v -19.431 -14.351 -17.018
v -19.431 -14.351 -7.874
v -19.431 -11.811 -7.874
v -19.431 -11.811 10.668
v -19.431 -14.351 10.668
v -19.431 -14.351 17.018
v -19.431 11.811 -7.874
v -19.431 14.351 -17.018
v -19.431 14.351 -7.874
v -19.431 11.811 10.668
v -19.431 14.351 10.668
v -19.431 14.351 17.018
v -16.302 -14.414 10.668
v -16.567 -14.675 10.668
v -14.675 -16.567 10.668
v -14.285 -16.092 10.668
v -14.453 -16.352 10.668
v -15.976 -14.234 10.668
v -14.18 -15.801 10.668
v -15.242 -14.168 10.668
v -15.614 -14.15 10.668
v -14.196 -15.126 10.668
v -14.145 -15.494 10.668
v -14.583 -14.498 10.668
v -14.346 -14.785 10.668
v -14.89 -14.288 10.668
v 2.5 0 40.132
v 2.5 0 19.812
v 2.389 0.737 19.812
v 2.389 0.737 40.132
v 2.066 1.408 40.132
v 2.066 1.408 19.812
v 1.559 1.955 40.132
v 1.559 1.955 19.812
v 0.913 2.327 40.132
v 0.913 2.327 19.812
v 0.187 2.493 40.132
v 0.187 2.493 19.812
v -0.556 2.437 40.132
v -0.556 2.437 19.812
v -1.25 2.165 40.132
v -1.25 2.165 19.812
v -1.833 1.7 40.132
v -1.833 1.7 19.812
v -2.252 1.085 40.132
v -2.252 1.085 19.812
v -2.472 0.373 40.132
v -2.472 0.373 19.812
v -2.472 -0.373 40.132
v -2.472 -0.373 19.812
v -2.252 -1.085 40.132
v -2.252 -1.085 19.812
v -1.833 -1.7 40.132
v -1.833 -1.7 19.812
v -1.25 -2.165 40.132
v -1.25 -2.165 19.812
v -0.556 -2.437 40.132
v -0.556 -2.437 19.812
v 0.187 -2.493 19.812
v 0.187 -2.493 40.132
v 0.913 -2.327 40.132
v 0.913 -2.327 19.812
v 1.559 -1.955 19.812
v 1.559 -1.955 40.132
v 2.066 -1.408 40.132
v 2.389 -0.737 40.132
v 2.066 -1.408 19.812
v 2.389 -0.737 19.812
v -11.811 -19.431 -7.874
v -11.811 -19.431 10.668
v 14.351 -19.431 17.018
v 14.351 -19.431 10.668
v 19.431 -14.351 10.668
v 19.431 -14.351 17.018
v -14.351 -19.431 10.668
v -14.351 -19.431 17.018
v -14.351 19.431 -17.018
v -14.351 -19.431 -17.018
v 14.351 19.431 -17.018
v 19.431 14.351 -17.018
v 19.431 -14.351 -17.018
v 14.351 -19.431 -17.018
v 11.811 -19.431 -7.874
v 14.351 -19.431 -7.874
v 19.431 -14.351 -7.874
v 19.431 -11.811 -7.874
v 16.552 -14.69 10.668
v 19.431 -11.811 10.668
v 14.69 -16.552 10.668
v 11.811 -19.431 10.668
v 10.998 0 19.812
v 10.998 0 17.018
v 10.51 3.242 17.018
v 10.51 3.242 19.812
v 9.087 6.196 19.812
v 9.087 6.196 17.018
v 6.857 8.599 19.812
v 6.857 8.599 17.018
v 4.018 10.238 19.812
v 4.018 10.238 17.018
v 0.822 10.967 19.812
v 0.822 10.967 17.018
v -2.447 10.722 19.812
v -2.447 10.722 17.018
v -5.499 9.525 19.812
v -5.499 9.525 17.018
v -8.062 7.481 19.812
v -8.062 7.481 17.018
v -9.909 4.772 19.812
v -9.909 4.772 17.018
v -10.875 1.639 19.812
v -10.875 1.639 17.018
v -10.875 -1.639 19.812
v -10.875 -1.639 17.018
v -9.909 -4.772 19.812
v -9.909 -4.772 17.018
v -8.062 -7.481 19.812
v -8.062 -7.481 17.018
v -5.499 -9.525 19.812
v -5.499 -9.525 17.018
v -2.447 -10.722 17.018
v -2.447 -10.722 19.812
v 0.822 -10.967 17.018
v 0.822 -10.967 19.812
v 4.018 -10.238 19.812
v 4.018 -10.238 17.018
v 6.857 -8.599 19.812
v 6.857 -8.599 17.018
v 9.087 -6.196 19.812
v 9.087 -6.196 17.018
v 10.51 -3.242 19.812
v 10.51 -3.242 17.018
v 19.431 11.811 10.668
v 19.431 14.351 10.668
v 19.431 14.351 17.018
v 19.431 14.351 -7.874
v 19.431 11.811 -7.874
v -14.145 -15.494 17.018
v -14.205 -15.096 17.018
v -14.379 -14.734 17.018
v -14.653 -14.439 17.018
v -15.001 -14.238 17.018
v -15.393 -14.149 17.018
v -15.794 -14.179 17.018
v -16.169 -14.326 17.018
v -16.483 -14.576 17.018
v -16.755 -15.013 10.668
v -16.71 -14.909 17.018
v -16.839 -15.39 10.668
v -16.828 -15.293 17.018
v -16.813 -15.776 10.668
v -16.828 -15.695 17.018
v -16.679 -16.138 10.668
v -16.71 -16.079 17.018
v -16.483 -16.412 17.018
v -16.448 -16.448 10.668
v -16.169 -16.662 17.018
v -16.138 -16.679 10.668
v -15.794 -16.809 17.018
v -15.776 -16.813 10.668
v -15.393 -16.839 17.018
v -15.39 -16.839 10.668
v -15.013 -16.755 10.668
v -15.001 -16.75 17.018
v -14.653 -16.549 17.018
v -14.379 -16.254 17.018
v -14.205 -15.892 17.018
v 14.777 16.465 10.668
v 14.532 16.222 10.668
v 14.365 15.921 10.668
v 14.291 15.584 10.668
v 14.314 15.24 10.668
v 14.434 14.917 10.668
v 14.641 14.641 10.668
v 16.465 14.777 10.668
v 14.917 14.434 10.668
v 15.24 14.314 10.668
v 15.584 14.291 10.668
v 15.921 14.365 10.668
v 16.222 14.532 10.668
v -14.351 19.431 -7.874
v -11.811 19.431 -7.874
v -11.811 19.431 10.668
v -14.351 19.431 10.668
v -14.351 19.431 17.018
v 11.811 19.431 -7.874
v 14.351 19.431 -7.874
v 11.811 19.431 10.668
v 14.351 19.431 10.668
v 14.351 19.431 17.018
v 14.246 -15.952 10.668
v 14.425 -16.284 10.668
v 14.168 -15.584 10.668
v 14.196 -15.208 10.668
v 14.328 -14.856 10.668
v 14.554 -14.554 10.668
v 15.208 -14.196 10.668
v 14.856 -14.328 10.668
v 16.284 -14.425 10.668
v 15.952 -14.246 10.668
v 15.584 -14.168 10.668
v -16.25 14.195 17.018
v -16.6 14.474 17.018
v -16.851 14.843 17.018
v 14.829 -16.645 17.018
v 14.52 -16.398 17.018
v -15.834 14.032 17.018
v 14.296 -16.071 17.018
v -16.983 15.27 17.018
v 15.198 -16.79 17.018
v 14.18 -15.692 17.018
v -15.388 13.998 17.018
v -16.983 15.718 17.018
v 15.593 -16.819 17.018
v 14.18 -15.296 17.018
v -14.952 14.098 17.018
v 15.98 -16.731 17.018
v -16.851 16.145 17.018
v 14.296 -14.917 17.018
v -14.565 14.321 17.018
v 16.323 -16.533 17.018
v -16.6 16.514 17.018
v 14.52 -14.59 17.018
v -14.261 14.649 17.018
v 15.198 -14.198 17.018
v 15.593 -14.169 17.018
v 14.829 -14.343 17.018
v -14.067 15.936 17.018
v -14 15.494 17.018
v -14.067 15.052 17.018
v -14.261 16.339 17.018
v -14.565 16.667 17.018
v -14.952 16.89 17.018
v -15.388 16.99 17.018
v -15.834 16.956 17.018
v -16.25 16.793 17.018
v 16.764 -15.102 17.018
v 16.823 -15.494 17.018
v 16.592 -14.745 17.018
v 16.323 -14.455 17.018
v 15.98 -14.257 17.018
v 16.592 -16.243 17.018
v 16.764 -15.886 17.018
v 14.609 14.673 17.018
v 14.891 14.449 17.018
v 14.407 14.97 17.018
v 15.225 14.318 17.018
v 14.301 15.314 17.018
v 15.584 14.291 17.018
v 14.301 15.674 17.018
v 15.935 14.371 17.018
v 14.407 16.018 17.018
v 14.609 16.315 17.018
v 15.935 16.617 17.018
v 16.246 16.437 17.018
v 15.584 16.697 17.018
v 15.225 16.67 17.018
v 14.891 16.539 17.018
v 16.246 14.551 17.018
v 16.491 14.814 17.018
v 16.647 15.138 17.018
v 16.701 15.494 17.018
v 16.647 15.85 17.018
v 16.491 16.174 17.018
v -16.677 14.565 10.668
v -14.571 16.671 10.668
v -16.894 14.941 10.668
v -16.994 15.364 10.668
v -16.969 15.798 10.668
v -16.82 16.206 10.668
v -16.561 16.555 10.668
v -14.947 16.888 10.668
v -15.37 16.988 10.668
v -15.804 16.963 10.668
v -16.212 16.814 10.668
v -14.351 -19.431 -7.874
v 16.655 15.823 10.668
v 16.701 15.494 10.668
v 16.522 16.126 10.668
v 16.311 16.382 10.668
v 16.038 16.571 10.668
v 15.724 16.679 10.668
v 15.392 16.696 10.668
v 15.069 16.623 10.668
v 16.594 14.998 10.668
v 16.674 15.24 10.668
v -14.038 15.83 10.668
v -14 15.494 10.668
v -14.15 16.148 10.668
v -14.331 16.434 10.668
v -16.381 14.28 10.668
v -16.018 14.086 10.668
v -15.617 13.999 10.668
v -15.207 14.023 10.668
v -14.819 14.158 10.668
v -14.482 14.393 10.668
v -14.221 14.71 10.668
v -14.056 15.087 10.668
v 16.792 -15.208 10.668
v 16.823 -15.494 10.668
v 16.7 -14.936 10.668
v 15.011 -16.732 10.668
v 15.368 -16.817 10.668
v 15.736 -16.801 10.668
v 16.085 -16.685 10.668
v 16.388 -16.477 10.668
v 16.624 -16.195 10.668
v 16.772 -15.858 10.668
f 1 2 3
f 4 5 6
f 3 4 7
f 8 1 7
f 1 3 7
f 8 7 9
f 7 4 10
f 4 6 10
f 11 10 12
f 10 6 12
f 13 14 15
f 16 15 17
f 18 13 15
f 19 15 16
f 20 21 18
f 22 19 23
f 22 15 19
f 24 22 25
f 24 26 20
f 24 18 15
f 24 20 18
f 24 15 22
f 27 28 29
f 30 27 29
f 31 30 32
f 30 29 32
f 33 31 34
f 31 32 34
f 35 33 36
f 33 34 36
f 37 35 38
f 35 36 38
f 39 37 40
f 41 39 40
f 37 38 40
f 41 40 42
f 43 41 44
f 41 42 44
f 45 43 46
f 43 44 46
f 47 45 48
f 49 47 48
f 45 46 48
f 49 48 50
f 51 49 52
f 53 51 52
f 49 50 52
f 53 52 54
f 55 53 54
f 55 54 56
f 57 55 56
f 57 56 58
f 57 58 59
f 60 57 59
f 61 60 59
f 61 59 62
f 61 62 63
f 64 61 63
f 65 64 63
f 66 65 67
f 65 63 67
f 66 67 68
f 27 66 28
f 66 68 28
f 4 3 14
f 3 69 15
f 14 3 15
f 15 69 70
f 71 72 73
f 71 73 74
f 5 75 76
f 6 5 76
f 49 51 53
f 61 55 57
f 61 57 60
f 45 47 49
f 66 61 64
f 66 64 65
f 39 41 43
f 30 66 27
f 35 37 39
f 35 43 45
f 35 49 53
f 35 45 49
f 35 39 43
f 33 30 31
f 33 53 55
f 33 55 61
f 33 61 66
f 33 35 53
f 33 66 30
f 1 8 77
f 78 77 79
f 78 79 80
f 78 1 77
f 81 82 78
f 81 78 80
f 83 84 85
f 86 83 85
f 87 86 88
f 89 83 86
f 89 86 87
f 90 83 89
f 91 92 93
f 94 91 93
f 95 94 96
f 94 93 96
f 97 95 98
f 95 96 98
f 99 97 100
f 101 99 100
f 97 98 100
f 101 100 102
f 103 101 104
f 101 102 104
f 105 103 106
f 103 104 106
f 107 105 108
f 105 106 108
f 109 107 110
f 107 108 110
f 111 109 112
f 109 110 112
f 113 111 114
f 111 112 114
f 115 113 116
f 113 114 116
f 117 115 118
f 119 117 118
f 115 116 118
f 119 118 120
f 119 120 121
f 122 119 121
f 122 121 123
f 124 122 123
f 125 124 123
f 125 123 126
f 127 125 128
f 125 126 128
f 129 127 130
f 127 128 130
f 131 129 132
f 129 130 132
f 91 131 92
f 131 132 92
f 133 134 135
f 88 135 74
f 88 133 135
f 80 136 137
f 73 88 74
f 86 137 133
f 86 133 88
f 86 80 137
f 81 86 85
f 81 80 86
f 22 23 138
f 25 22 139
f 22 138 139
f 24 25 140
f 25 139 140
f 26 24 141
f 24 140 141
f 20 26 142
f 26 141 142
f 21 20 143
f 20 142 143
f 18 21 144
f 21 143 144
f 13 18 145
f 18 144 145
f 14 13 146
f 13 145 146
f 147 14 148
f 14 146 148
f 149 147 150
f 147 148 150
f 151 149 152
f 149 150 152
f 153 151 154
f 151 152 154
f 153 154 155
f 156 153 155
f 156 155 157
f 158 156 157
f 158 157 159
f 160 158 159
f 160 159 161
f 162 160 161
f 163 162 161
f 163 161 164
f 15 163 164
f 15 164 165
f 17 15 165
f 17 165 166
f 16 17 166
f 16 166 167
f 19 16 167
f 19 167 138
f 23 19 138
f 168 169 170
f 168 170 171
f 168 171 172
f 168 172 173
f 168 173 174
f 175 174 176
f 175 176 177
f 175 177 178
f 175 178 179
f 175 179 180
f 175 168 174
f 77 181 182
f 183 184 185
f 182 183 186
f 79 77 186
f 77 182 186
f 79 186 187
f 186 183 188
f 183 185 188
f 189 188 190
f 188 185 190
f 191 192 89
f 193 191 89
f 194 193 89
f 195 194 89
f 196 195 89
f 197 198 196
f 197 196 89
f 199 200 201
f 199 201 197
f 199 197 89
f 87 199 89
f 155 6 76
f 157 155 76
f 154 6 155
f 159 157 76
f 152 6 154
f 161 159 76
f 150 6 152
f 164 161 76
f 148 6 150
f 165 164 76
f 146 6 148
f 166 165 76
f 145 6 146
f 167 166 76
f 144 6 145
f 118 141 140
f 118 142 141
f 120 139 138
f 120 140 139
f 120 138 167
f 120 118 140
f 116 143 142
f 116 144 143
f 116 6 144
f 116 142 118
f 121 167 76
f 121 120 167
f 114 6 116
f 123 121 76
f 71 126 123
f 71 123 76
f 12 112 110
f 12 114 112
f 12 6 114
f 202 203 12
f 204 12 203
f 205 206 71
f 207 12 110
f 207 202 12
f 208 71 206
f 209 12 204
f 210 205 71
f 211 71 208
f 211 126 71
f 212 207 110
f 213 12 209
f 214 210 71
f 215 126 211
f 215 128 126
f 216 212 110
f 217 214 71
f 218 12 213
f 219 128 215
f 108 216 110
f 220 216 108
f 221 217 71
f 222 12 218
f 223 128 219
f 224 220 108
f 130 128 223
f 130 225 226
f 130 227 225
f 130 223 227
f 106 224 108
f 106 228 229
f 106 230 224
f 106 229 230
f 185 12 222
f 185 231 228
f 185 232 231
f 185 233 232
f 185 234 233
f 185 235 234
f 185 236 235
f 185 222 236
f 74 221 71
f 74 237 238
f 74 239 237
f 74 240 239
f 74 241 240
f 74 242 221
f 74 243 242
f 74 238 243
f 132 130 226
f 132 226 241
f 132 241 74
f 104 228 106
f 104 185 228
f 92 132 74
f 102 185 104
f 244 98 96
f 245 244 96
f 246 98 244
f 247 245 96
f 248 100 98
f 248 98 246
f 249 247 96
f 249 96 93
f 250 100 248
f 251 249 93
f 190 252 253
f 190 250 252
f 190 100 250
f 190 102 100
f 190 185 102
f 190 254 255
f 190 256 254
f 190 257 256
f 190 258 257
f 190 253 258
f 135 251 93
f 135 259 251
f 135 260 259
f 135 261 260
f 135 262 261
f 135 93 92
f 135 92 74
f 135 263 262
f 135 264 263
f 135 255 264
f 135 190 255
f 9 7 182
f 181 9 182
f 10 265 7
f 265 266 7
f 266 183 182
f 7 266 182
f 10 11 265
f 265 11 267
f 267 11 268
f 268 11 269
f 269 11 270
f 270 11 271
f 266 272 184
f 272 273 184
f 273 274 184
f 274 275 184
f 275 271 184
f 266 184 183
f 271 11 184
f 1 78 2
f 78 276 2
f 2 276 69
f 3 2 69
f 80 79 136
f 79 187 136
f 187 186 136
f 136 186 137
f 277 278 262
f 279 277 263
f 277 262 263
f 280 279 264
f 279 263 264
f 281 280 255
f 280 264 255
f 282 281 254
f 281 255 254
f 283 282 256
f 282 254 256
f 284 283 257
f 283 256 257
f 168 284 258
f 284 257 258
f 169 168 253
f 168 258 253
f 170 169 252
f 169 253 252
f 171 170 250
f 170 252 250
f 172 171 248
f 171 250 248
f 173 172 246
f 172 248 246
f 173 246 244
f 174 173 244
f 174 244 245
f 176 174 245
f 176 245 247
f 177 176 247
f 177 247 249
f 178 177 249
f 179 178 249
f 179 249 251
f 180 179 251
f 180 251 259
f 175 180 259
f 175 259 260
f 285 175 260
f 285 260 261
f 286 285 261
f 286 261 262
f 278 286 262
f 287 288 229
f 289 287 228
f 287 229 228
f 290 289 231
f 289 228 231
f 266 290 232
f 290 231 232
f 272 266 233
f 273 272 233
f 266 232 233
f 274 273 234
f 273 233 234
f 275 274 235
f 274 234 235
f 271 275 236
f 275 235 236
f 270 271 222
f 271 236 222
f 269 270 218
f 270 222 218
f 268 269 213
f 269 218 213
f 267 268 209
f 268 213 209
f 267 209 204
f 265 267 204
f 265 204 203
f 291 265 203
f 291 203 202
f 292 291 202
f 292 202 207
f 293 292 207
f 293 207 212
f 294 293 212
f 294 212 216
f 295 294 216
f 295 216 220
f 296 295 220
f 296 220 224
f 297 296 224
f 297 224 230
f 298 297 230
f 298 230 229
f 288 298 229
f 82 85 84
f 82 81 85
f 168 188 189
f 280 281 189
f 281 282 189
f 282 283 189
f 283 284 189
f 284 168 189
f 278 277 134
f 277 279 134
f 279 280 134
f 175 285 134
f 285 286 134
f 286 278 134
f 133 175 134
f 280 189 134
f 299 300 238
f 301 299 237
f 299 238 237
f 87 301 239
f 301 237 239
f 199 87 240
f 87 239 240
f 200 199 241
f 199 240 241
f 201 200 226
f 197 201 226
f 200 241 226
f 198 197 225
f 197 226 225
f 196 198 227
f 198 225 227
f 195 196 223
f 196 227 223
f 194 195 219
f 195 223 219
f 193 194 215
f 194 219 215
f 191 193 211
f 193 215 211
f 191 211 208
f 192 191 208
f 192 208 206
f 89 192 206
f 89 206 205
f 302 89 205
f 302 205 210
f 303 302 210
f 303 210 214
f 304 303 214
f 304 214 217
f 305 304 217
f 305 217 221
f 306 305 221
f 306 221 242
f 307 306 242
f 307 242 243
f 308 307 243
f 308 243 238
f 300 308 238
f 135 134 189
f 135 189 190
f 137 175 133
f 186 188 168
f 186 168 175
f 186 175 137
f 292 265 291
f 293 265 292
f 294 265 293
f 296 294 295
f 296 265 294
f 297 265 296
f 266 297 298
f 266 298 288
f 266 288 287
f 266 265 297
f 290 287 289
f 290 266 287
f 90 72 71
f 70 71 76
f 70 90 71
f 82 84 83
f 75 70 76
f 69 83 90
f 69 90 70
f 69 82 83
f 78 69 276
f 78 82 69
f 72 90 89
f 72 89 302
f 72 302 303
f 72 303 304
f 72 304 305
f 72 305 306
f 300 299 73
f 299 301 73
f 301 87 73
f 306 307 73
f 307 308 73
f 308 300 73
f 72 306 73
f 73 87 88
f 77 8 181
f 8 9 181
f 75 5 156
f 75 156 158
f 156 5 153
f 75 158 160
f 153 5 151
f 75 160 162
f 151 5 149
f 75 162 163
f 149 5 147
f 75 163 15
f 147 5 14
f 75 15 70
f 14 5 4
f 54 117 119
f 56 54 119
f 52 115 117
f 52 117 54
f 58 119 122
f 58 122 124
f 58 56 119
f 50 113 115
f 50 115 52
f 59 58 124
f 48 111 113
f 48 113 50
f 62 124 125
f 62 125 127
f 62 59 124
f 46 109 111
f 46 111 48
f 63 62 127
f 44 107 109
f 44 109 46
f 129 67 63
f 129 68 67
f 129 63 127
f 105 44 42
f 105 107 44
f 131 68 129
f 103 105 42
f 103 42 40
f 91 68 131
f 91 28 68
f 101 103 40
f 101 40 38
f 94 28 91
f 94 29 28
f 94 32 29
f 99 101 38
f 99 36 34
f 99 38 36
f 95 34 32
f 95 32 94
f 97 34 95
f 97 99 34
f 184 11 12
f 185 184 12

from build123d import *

# Parameters (mm, degrees)
F0_W      = 38.862
F0_H      = 38.862
F1_DEPTH  = 10.668
F2_SIZE   = 7.62
F4_DEPTH  = 6.35
F5_SIZE   = 5.08
F7_DEPTH  = 6.35
F8_R      = 10.9982
F9_DEPTH  = 2.794
F10_R     = 2.5
F11_DEPTH = 20.32
F12_W     = 13.1343230445
F12_H     = 2.3335092461
F13_DEPTH = 10.16
F14_R     = 1.5
F14_R_2   = 1.2067449727
F14_R_3   = 1.3291263225
F14_R_4   = 1.3491824754
F15_DEPTH = 6.35


# Not quite as in the source:
# - a feature names something its author has since deleted; it is built from what else it names


with BuildPart() as f1:
    # F0 (on Top) → F1 (new body, symmetric)
    with BuildSketch(Plane.XY):
        Rectangle(F0_W, F0_H)
    extrude(amount=F1_DEPTH, both=True)

    # F2
    f2_edges = [f1.edges().sort_by_distance(p)[0] for p in [
        (19.431, 19.431, 0),
        (-19.431, 19.431, 0),
        (-19.431, -19.431, 0),
        (19.431, -19.431, 0),
    ]]
    chamfer(f2_edges, length=F2_SIZE)

    # F3 (on face) → F4 (join)
    with BuildSketch(Plane.XY.offset(10.668)):
        Polygon((11.811, 19.431), (-11.811, 19.431), (-19.431, 11.811), (-19.431, -11.811), (-11.811, -19.431), (11.811, -19.431), (19.431, -11.811), (19.431, 11.811), align=None)
        Polygon((19.431, 19.431), (11.811, 19.431), (19.431, 11.811), align=None)
        Polygon((-11.811, 19.431), (-19.431, 19.431), (-19.431, 11.811), align=None)
        Polygon((-11.811, -19.431), (-19.431, -11.811), (-19.431, -19.431), align=None)
        Polygon((19.431, -19.431), (19.431, -11.811), (11.811, -19.431), align=None)
    extrude(amount=F4_DEPTH)

    # F5
    f5_edges = [f1.edges().sort_by_distance(p)[0] for p in [
        (19.431, 19.431, 13.843),
        (-19.431, 19.431, 13.843),
        (-19.431, -19.431, 13.843),
        (19.431, -19.431, 13.843),
    ]]
    chamfer(f5_edges, length=F5_SIZE)

    # F6 (on face) → F7 (join)
    with BuildSketch(Plane(origin=(0, 0, -10.668), x_dir=(1, 0, 0), z_dir=(0, 0, -1))):
        Polygon((-11.811, 19.431), (-14.351, 19.431), (-19.431, 14.351), (-19.431, 11.811), align=None)
        Polygon((14.351, 19.431), (11.811, 19.431), (19.431, 11.811), (19.431, 14.351), align=None)
        Polygon((19.431, -14.351), (19.431, -11.811), (11.811, -19.431), (14.351, -19.431), align=None)
        Polygon((-11.811, -19.431), (-19.431, -11.811), (-19.431, -14.351), (-14.351, -19.431), align=None)
        Polygon((11.811, 19.431), (-11.811, 19.431), (-19.431, 11.811), (-19.431, -11.811), (-11.811, -19.431), (11.811, -19.431), (19.431, -11.811), (19.431, 11.811), align=None)
    extrude(amount=F7_DEPTH)

    # F8 (on face) + F6 (on face) → F9 (join)
    with BuildSketch(Plane.XY.offset(17.018)):
        Circle(F8_R)
    with BuildSketch(Plane(origin=(0, 0, -10.668), x_dir=(1, 0, 0), z_dir=(0, 0, -1))):
        Polygon((14.351, 19.431), (-14.351, 19.431), (-19.431, 14.351), (-19.431, -14.351), (-14.351, -19.431), (14.351, -19.431), (19.431, -14.351), (19.431, 14.351), align=None)
    extrude(amount=F9_DEPTH, dir=(0, 0, 1))

    # F10 (on face) → F11 (join)
    with BuildSketch(Plane.XY.offset(19.812)):
        Circle(F10_R)
    extrude(amount=F11_DEPTH)

    # F12 (on face) → F13 (cut)
    with BuildSketch(Plane.XY.offset(40.132)):
        with Locations((-0.0065014465, 6.166754623)):
            Rectangle(F12_W, F12_H)
    extrude(amount=-F13_DEPTH, mode=Mode.SUBTRACT)

    # F14 (on face) → F15 (cut)
    with BuildSketch(Plane.XY.offset(17.018)):
        with Locations((-15.5, 15.494)):
            Circle(F14_R)
        with Locations((15.494, 15.494)):
            Circle(F14_R_2)
        with Locations((15.494, -15.494)):
            Circle(F14_R_3)
        with Locations((-15.494, -15.494)):
            Circle(F14_R_4)
    extrude(amount=-F15_DEPTH, mode=Mode.SUBTRACT)


solid = f1.part
